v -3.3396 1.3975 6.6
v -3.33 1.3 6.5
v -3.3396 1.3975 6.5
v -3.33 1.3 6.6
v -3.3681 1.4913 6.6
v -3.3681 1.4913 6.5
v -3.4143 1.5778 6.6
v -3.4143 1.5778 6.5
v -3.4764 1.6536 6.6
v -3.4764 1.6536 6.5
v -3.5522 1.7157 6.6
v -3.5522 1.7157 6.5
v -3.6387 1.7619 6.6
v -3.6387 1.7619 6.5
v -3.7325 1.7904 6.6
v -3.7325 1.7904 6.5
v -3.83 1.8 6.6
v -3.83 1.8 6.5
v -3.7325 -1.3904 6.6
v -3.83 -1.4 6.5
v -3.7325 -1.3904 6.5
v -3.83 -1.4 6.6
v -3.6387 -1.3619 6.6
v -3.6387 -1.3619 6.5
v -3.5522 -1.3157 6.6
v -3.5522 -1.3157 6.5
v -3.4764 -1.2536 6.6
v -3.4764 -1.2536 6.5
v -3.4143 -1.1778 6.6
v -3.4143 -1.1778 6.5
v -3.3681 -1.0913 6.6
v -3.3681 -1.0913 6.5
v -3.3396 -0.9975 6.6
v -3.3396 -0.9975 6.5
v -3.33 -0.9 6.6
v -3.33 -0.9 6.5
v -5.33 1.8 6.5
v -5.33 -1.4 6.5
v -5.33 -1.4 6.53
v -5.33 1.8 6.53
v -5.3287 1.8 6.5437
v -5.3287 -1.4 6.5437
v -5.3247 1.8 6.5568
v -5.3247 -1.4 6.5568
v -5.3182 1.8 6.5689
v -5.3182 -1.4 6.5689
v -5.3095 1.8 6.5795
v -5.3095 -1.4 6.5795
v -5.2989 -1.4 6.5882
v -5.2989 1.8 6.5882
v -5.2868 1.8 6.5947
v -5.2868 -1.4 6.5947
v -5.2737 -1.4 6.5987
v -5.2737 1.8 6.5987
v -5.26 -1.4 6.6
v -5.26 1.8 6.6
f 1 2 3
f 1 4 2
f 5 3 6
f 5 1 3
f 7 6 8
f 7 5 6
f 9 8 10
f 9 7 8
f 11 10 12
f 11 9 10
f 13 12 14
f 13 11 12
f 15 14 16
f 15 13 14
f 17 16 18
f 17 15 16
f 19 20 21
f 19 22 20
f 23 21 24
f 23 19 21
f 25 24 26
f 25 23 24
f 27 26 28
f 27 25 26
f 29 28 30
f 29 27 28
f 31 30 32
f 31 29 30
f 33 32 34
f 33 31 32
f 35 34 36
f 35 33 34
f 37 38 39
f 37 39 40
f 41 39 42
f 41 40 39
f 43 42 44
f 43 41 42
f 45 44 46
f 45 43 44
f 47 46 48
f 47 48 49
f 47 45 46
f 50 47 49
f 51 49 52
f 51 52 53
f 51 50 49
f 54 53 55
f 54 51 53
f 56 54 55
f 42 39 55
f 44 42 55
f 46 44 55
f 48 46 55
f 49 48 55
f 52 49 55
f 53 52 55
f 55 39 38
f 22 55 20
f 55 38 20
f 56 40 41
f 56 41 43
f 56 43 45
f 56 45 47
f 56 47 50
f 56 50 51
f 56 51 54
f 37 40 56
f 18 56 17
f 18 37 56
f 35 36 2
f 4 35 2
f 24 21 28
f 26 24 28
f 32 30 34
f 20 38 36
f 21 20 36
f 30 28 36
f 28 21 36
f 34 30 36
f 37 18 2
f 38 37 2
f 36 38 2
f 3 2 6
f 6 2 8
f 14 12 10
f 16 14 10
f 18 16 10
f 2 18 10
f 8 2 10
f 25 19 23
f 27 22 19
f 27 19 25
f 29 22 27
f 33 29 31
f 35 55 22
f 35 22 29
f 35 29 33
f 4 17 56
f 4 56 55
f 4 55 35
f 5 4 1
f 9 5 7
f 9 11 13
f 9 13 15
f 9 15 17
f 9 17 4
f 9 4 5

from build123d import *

# Parameters (mm, degrees)
SKETCH007_W  = 2
SKETCH007_H  = 3.2
PAD010_DEPTH = 0.1
FILLET013_R  = 0.5
FILLET014_R  = 0.07


with BuildPart() as part:
    # Sketch007 → Pad010 (new body)
    with BuildSketch(Plane.XY):
        with Locations((-4.33, 0.2)):
            Rectangle(SKETCH007_W, SKETCH007_H)
    extrude(amount=PAD010_DEPTH)

    # Fillet013
    fillet013_edges = [part.edges().sort_by_distance(p)[0] for p in [
        (-3.33, -1.4, 0.05),
        (-3.33, 1.8, 0.05),
    ]]
    fillet(fillet013_edges, radius=FILLET013_R)

    # Fillet014
    fillet014_edges = [part.edges().sort_by_distance(p)[0] for p in [
        (-5.33, 0.2, 0.1),
    ]]
    fillet(fillet014_edges, radius=FILLET014_R)


with BuildPart() as part_1:
    # Body008 placement: moved
    add(part.part.moved(Location((0, 0, 6.5))))


solid = part_1.part
